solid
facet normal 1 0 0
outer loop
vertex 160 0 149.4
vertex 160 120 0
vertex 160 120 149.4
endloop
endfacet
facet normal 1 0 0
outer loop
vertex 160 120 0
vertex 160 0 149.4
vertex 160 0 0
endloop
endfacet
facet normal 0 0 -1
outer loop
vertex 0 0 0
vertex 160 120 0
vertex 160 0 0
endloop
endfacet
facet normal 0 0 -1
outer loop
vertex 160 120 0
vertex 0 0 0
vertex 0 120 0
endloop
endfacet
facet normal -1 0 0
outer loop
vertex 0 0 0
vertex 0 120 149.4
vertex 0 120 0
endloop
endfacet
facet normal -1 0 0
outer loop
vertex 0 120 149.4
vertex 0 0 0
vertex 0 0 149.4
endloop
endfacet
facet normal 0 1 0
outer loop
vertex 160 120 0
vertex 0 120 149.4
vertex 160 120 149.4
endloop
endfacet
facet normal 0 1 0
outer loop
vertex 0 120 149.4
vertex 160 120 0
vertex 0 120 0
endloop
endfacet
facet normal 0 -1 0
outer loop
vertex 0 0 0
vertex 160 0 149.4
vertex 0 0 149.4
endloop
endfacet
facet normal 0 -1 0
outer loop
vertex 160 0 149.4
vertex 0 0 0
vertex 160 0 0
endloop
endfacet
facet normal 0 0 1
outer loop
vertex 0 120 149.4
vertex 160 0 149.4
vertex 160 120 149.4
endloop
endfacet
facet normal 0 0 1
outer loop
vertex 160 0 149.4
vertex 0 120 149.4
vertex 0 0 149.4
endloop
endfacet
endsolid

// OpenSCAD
// Architectural thermal visualization; dimensions are scaled.
color([0.9214,0,0.0786,0.75]) translate([0,0,0.00000]) cube([160.00000,120.00000,18.00000]);
color([0.9936,0,0.0064,0.75]) translate([0,0,18.00000]) cube([160.00000,120.00000,10.00000]);
color([0.9965,0,0.0035,0.75]) translate([0,0,28.00000]) cube([160.00000,120.00000,10.00000]);
color([0.9984,0,0.0016,0.75]) translate([0,0,38.00000]) cube([160.00000,120.00000,1.50000]);
color([1.0000,0,0.0000,0.75]) translate([0,0,39.50000]) cube([160.00000,120.00000,3.20000]);
color([0.9995,0,0.0005,0.75]) translate([0,0,42.70000]) cube([160.00000,120.00000,1.50000]);
color([0.9990,0,0.0010,0.75]) translate([0,0,44.20000]) cube([160.00000,120.00000,3.20000]);
color([0.9964,0,0.0036,0.75]) translate([0,0,47.40000]) cube([160.00000,120.00000,1.50000]);
color([0.9938,0,0.0062,0.75]) translate([0,0,48.90000]) cube([160.00000,120.00000,3.20000]);
color([0.9891,0,0.0109,0.75]) translate([0,0,52.10000]) cube([160.00000,120.00000,1.50000]);
color([0.9844,0,0.0156,0.75]) translate([0,0,53.60000]) cube([160.00000,120.00000,3.20000]);
color([0.9776,0,0.0224,0.75]) translate([0,0,56.80000]) cube([160.00000,120.00000,1.50000]);
color([0.9708,0,0.0292,0.75]) translate([0,0,58.30000]) cube([160.00000,120.00000,3.20000]);
color([0.9619,0,0.0381,0.75]) translate([0,0,61.50000]) cube([160.00000,120.00000,1.50000]);
color([0.9530,0,0.0470,0.75]) translate([0,0,63.00000]) cube([160.00000,120.00000,3.20000]);
color([0.9419,0,0.0581,0.75]) translate([0,0,66.20000]) cube([160.00000,120.00000,1.50000]);
color([0.9308,0,0.0692,0.75]) translate([0,0,67.70000]) cube([160.00000,120.00000,3.20000]);
color([0.9174,0,0.0826,0.75]) translate([0,0,70.90000]) cube([160.00000,120.00000,1.50000]);
color([0.9041,0,0.0959,0.75]) translate([0,0,72.40000]) cube([160.00000,120.00000,3.20000]);
color([0.8885,0,0.1115,0.75]) translate([0,0,75.60000]) cube([160.00000,120.00000,1.50000]);
color([0.8729,0,0.1271,0.75]) translate([0,0,77.10000]) cube([160.00000,120.00000,3.20000]);
color([0.8549,0,0.1451,0.75]) translate([0,0,80.30000]) cube([160.00000,120.00000,1.50000]);
color([0.8369,0,0.1631,0.75]) translate([0,0,81.80000]) cube([160.00000,120.00000,3.20000]);
color([0.8164,0,0.1836,0.75]) translate([0,0,85.00000]) cube([160.00000,120.00000,1.50000]);
color([0.7959,0,0.2041,0.75]) translate([0,0,86.50000]) cube([160.00000,120.00000,3.20000]);
color([0.7727,0,0.2273,0.75]) translate([0,0,89.70000]) cube([160.00000,120.00000,1.50000]);
color([0.7495,0,0.2505,0.75]) translate([0,0,91.20000]) cube([160.00000,120.00000,3.20000]);
color([0.6473,0,0.3527,0.75]) translate([0,0,94.40000]) cube([160.00000,120.00000,5.00000]);
color([0.5372,0,0.4628,0.75]) translate([0,0,99.40000]) cube([160.00000,120.00000,50.00000]);
